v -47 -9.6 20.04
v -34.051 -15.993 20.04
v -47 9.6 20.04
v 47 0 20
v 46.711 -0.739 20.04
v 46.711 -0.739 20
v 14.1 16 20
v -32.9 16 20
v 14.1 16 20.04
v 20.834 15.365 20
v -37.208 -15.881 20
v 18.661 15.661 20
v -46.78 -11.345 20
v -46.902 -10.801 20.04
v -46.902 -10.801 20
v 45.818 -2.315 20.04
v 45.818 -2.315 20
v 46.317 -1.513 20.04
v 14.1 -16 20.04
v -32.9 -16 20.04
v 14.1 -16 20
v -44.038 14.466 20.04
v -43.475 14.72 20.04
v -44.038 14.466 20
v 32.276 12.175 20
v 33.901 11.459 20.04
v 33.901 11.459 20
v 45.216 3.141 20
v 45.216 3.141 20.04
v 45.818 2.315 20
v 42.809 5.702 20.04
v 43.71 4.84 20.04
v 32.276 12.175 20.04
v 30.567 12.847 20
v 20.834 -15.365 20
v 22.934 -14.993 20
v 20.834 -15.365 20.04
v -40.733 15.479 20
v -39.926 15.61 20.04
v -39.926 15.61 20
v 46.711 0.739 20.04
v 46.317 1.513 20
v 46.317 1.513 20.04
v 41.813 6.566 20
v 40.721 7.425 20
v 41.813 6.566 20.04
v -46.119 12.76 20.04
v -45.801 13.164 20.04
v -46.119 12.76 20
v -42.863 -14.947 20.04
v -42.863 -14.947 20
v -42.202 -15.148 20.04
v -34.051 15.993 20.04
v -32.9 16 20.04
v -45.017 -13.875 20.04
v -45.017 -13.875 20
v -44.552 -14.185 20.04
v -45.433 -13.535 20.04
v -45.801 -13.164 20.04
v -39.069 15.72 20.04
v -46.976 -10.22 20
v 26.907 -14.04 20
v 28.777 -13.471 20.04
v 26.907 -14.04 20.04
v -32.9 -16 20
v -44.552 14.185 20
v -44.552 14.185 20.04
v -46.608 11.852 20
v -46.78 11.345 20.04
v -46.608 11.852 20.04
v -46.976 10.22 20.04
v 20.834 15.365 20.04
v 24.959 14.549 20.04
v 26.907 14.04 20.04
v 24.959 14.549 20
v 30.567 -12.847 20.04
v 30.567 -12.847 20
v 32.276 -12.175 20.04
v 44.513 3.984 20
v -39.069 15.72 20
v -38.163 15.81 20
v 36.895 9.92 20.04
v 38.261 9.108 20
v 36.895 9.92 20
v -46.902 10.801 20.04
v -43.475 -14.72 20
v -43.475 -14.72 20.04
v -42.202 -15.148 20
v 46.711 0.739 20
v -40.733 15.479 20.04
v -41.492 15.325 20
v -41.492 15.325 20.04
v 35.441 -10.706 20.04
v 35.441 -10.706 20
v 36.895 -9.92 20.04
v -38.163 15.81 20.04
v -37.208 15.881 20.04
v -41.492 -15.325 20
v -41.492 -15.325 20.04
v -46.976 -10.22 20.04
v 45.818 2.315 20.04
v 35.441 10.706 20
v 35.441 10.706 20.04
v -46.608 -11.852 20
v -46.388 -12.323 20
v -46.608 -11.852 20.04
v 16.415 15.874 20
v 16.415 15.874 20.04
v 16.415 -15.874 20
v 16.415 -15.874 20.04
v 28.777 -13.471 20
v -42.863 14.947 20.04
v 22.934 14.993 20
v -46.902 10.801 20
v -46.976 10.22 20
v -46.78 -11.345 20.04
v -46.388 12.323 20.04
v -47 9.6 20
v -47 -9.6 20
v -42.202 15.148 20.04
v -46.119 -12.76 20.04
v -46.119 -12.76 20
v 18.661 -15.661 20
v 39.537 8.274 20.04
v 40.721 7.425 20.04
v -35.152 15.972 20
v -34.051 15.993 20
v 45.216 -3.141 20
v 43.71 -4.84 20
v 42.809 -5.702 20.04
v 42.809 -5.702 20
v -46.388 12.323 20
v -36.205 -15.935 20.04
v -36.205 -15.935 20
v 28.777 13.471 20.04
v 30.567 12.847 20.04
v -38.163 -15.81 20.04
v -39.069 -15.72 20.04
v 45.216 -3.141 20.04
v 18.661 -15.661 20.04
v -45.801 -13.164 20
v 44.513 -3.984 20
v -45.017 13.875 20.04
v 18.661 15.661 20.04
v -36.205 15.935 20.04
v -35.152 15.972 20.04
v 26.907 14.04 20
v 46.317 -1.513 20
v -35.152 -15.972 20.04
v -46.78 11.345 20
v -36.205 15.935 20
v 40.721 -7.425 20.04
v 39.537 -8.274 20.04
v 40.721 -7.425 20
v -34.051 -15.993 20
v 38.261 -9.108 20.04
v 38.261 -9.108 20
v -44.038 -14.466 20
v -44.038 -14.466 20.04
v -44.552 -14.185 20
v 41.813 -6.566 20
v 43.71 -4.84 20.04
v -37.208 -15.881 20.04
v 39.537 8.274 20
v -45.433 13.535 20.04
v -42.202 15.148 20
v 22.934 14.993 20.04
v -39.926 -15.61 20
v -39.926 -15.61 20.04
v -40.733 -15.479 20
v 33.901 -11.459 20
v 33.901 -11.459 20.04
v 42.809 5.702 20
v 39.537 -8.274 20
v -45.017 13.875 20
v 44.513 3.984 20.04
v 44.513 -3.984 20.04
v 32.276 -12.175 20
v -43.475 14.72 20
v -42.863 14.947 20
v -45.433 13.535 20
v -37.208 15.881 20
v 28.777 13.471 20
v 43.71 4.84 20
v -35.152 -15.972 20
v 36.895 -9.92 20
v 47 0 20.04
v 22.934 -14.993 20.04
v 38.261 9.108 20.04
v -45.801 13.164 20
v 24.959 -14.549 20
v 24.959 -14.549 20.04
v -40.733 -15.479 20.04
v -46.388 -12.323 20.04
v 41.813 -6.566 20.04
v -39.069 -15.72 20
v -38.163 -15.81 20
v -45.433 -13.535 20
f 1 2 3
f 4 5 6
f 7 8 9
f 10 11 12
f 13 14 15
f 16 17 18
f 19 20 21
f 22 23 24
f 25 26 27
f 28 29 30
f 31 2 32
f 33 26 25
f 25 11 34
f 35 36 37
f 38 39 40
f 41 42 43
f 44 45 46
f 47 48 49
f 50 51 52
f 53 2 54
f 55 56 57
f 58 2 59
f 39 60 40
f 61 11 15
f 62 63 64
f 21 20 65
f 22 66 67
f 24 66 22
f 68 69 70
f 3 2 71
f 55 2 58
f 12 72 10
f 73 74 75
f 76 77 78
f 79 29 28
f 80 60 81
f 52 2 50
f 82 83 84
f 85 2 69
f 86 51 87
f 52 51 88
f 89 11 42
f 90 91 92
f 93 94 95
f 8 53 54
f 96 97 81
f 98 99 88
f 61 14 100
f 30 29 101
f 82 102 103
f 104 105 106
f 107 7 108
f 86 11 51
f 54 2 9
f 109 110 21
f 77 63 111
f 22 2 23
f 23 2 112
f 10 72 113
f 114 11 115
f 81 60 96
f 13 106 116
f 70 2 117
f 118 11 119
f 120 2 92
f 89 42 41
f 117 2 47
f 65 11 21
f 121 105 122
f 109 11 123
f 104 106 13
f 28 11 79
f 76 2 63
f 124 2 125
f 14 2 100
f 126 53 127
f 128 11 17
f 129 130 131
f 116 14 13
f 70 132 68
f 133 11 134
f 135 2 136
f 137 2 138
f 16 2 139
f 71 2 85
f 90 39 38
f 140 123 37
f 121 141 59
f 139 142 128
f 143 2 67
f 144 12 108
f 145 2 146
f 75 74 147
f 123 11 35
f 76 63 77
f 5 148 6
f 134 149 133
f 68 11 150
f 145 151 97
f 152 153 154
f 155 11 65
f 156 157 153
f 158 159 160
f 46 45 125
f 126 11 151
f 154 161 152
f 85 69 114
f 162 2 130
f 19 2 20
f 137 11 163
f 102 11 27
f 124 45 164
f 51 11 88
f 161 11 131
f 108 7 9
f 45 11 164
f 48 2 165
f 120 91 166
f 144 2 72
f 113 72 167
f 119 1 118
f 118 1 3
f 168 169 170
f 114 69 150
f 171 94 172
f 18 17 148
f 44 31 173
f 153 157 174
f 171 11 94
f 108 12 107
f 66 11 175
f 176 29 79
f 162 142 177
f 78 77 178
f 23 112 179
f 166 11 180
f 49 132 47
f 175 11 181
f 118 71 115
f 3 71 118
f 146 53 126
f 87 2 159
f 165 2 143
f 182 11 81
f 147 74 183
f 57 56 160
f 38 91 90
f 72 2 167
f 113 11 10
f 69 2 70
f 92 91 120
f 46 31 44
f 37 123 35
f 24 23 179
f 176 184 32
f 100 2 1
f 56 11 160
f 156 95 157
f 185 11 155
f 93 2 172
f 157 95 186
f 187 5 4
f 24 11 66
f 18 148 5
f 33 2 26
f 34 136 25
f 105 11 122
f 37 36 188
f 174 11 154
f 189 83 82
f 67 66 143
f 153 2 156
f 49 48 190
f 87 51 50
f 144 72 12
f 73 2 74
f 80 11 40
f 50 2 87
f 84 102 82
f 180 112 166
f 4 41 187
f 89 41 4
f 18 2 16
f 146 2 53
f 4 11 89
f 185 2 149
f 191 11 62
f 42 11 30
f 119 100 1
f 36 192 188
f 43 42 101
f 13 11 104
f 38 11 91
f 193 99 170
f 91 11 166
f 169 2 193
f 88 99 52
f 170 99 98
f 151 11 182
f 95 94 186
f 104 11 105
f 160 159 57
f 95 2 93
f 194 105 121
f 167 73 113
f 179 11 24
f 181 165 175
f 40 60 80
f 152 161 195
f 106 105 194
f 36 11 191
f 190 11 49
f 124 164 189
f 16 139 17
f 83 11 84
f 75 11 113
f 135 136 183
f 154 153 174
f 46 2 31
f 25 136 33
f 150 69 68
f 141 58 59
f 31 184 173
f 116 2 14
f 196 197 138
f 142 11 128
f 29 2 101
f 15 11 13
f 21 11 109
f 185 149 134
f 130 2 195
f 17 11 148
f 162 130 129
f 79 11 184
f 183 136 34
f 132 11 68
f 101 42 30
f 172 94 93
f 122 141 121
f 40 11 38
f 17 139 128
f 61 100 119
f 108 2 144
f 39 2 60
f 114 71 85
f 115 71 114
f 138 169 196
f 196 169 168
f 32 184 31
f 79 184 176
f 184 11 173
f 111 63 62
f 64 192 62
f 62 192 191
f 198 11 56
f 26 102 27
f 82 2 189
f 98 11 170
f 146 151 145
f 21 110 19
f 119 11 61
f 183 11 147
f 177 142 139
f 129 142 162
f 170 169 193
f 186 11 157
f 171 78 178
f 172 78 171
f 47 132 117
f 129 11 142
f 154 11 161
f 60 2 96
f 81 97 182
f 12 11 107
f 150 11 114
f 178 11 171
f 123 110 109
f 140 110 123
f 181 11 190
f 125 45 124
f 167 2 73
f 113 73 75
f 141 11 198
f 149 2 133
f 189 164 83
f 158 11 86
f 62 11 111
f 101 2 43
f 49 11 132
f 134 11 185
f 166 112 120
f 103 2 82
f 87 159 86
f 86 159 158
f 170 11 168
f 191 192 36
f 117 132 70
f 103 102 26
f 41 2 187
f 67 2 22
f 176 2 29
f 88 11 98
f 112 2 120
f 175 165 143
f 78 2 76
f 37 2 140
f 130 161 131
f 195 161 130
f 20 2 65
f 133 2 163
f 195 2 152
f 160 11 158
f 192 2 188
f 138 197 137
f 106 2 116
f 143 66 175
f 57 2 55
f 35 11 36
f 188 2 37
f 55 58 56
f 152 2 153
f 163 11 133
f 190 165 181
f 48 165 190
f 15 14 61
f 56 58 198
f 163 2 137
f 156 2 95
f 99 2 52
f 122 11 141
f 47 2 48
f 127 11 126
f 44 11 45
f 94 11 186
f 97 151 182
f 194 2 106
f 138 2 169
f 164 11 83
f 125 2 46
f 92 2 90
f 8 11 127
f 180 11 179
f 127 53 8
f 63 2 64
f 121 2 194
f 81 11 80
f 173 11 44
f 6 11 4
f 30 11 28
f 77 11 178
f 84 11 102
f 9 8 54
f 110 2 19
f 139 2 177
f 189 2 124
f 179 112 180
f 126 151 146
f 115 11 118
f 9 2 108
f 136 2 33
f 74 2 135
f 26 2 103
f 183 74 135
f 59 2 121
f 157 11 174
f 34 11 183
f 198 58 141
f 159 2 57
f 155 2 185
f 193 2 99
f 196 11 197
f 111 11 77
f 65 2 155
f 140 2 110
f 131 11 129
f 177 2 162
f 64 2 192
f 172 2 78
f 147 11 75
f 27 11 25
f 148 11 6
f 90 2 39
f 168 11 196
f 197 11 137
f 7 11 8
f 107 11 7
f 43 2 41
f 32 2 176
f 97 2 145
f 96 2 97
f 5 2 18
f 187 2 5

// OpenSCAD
hull() {
  translate([0, 0, 20]) {
    linear_extrude(height = 2.0e-2) {
      polygon(points = [[-47, -9.6], [-46.975520833, -10.220185185], [-46.902083333, -10.801481481], [-46.7796875, -11.345], [-46.608333333, -11.851851852], [-46.388020833, -12.323148148], [-46.11875, -12.76], [-45.800520833, -13.163518519], [-45.433333333, -13.534814815], [-45.0171875, -13.875], [-44.552083333, -14.185185185], [-44.038020833, -14.466481481], [-43.475, -14.72], [-42.863020833, -14.946851852], [-42.202083333, -15.148148148], [-41.4921875, -15.325], [-40.733333333, -15.478518519], [-39.925520833, -15.609814815], [-39.06875, -15.72], [-38.163020833, -15.810185185], [-37.208333333, -15.881481481], [-36.2046875, -15.935], [-35.152083333, -15.971851852], [-34.050520833, -15.993148148], [-32.9, -16], [-31.11370081, -16], [-29.282523148, -16], [-27.410546875, -16], [-25.501851852, -16], [-23.56051794, -16], [-21.590625, -16], [-19.596252894, -16], [-17.581481481, -16], [-15.550390625, -16], [-13.507060185, -16], [-11.455570023, -16], [-9.4, -16], [-7.344429977, -16], [-5.292939815, -16], [-3.249609375, -16], [-1.218518519, -16], [0.796252894, -16], [2.790625, -16], [4.76051794, -16], [6.701851852, -16], [8.610546875, -16], [10.482523148, -16], [12.31370081, -16], [14.1, -16], [16.415457176, -15.874259259], [18.660740741, -15.660740741], [20.83421875, -15.365], [22.934259259, -14.992592593], [24.959230324, -14.549074074], [26.9075, -14.04], [28.777436343, -13.470925926], [30.567407407, -12.847407407], [32.27578125, -12.175], [33.900925926, -11.459259259], [35.441209491, -10.705740741], [36.895, -9.92], [38.260665509, -9.107592593], [39.536574074, -8.274074074], [40.72109375, -7.425], [41.812592593, -6.565925926], [42.809438657, -5.702407407], [43.71, -4.84], [44.512644676, -3.984259259], [45.215740741, -3.140740741], [45.81765625, -2.315], [46.316759259, -1.512592593], [46.711417824, -0.739074074], [47, 0], [46.711417824, 0.739074074], [46.316759259, 1.512592593], [45.81765625, 2.315], [45.215740741, 3.140740741], [44.512644676, 3.984259259], [43.71, 4.84], [42.809438657, 5.702407407], [41.812592593, 6.565925926], [40.72109375, 7.425], [39.536574074, 8.274074074], [38.260665509, 9.107592593], [36.895, 9.92], [35.441209491, 10.705740741], [33.900925926, 11.459259259], [32.27578125, 12.175], [30.567407407, 12.847407407], [28.777436343, 13.470925926], [26.9075, 14.04], [24.959230324, 14.549074074], [22.934259259, 14.992592593], [20.83421875, 15.365], [18.660740741, 15.660740741], [16.415457176, 15.874259259], [14.1, 16], [12.31370081, 16], [10.482523148, 16], [8.610546875, 16], [6.701851852, 16], [4.76051794, 16], [2.790625, 16], [0.796252894, 16], [-1.218518519, 16], [-3.249609375, 16], [-5.292939815, 16], [-7.344429977, 16], [-9.4, 16], [-11.455570023, 16], [-13.507060185, 16], [-15.550390625, 16], [-17.581481481, 16], [-19.596252894, 16], [-21.590625, 16], [-23.56051794, 16], [-25.501851852, 16], [-27.410546875, 16], [-29.282523148, 16], [-31.11370081, 16], [-32.9, 16], [-34.050520833, 15.993148148], [-35.152083333, 15.971851852], [-36.2046875, 15.935], [-37.208333333, 15.881481481], [-38.163020833, 15.810185185], [-39.06875, 15.72], [-39.925520833, 15.609814815], [-40.733333333, 15.478518519], [-41.4921875, 15.325], [-42.202083333, 15.148148148], [-42.863020833, 14.946851852], [-43.475, 14.72], [-44.038020833, 14.466481481], [-44.552083333, 14.185185185], [-45.0171875, 13.875], [-45.433333333, 13.534814815], [-45.800520833, 13.163518519], [-46.11875, 12.76], [-46.388020833, 12.323148148], [-46.608333333, 11.851851852], [-46.7796875, 11.345], [-46.902083333, 10.801481481], [-46.975520833, 10.220185185], [-47, 9.6], [-47, 8.8], [-47, 8], [-47, 7.2], [-47, 6.4], [-47, 5.6], [-47, 4.8], [-47, 4], [-47, 3.2], [-47, 2.4], [-47, 1.6], [-47, 0.8], [-47, 0], [-47, -0.8], [-47, -1.6], [-47, -2.4], [-47, -3.2], [-47, -4], [-47, -4.8], [-47, -5.6], [-47, -6.4], [-47, -7.2], [-47, -8], [-47, -8.8], [-47, -9.6]]);
    }
  }
  translate([0, 0, 20.02]) {
    linear_extrude(height = 2.0e-2) {
      polygon(points = [[-47, -9.6], [-46.975520833, -10.220185185], [-46.902083333, -10.801481481], [-46.7796875, -11.345], [-46.608333333, -11.851851852], [-46.388020833, -12.323148148], [-46.11875, -12.76], [-45.800520833, -13.163518519], [-45.433333333, -13.534814815], [-45.0171875, -13.875], [-44.552083333, -14.185185185], [-44.038020833, -14.466481481], [-43.475, -14.72], [-42.863020833, -14.946851852], [-42.202083333, -15.148148148], [-41.4921875, -15.325], [-40.733333333, -15.478518519], [-39.925520833, -15.609814815], [-39.06875, -15.72], [-38.163020833, -15.810185185], [-37.208333333, -15.881481481], [-36.2046875, -15.935], [-35.152083333, -15.971851852], [-34.050520833, -15.993148148], [-32.9, -16], [-31.11370081, -16], [-29.282523148, -16], [-27.410546875, -16], [-25.501851852, -16], [-23.56051794, -16], [-21.590625, -16], [-19.596252894, -16], [-17.581481481, -16], [-15.550390625, -16], [-13.507060185, -16], [-11.455570023, -16], [-9.4, -16], [-7.344429977, -16], [-5.292939815, -16], [-3.249609375, -16], [-1.218518519, -16], [0.796252894, -16], [2.790625, -16], [4.76051794, -16], [6.701851852, -16], [8.610546875, -16], [10.482523148, -16], [12.31370081, -16], [14.1, -16], [16.415457176, -15.874259259], [18.660740741, -15.660740741], [20.83421875, -15.365], [22.934259259, -14.992592593], [24.959230324, -14.549074074], [26.9075, -14.04], [28.777436343, -13.470925926], [30.567407407, -12.847407407], [32.27578125, -12.175], [33.900925926, -11.459259259], [35.441209491, -10.705740741], [36.895, -9.92], [38.260665509, -9.107592593], [39.536574074, -8.274074074], [40.72109375, -7.425], [41.812592593, -6.565925926], [42.809438657, -5.702407407], [43.71, -4.84], [44.512644676, -3.984259259], [45.215740741, -3.140740741], [45.81765625, -2.315], [46.316759259, -1.512592593], [46.711417824, -0.739074074], [47, 0], [46.711417824, 0.739074074], [46.316759259, 1.512592593], [45.81765625, 2.315], [45.215740741, 3.140740741], [44.512644676, 3.984259259], [43.71, 4.84], [42.809438657, 5.702407407], [41.812592593, 6.565925926], [40.72109375, 7.425], [39.536574074, 8.274074074], [38.260665509, 9.107592593], [36.895, 9.92], [35.441209491, 10.705740741], [33.900925926, 11.459259259], [32.27578125, 12.175], [30.567407407, 12.847407407], [28.777436343, 13.470925926], [26.9075, 14.04], [24.959230324, 14.549074074], [22.934259259, 14.992592593], [20.83421875, 15.365], [18.660740741, 15.660740741], [16.415457176, 15.874259259], [14.1, 16], [12.31370081, 16], [10.482523148, 16], [8.610546875, 16], [6.701851852, 16], [4.76051794, 16], [2.790625, 16], [0.796252894, 16], [-1.218518519, 16], [-3.249609375, 16], [-5.292939815, 16], [-7.344429977, 16], [-9.4, 16], [-11.455570023, 16], [-13.507060185, 16], [-15.550390625, 16], [-17.581481481, 16], [-19.596252894, 16], [-21.590625, 16], [-23.56051794, 16], [-25.501851852, 16], [-27.410546875, 16], [-29.282523148, 16], [-31.11370081, 16], [-32.9, 16], [-34.050520833, 15.993148148], [-35.152083333, 15.971851852], [-36.2046875, 15.935], [-37.208333333, 15.881481481], [-38.163020833, 15.810185185], [-39.06875, 15.72], [-39.925520833, 15.609814815], [-40.733333333, 15.478518519], [-41.4921875, 15.325], [-42.202083333, 15.148148148], [-42.863020833, 14.946851852], [-43.475, 14.72], [-44.038020833, 14.466481481], [-44.552083333, 14.185185185], [-45.0171875, 13.875], [-45.433333333, 13.534814815], [-45.800520833, 13.163518519], [-46.11875, 12.76], [-46.388020833, 12.323148148], [-46.608333333, 11.851851852], [-46.7796875, 11.345], [-46.902083333, 10.801481481], [-46.975520833, 10.220185185], [-47, 9.6], [-47, 8.8], [-47, 8], [-47, 7.2], [-47, 6.4], [-47, 5.6], [-47, 4.8], [-47, 4], [-47, 3.2], [-47, 2.4], [-47, 1.6], [-47, 0.8], [-47, 0], [-47, -0.8], [-47, -1.6], [-47, -2.4], [-47, -3.2], [-47, -4], [-47, -4.8], [-47, -5.6], [-47, -6.4], [-47, -7.2], [-47, -8], [-47, -8.8], [-47, -9.6]]);
    }
  }
}
$fn = 50;
